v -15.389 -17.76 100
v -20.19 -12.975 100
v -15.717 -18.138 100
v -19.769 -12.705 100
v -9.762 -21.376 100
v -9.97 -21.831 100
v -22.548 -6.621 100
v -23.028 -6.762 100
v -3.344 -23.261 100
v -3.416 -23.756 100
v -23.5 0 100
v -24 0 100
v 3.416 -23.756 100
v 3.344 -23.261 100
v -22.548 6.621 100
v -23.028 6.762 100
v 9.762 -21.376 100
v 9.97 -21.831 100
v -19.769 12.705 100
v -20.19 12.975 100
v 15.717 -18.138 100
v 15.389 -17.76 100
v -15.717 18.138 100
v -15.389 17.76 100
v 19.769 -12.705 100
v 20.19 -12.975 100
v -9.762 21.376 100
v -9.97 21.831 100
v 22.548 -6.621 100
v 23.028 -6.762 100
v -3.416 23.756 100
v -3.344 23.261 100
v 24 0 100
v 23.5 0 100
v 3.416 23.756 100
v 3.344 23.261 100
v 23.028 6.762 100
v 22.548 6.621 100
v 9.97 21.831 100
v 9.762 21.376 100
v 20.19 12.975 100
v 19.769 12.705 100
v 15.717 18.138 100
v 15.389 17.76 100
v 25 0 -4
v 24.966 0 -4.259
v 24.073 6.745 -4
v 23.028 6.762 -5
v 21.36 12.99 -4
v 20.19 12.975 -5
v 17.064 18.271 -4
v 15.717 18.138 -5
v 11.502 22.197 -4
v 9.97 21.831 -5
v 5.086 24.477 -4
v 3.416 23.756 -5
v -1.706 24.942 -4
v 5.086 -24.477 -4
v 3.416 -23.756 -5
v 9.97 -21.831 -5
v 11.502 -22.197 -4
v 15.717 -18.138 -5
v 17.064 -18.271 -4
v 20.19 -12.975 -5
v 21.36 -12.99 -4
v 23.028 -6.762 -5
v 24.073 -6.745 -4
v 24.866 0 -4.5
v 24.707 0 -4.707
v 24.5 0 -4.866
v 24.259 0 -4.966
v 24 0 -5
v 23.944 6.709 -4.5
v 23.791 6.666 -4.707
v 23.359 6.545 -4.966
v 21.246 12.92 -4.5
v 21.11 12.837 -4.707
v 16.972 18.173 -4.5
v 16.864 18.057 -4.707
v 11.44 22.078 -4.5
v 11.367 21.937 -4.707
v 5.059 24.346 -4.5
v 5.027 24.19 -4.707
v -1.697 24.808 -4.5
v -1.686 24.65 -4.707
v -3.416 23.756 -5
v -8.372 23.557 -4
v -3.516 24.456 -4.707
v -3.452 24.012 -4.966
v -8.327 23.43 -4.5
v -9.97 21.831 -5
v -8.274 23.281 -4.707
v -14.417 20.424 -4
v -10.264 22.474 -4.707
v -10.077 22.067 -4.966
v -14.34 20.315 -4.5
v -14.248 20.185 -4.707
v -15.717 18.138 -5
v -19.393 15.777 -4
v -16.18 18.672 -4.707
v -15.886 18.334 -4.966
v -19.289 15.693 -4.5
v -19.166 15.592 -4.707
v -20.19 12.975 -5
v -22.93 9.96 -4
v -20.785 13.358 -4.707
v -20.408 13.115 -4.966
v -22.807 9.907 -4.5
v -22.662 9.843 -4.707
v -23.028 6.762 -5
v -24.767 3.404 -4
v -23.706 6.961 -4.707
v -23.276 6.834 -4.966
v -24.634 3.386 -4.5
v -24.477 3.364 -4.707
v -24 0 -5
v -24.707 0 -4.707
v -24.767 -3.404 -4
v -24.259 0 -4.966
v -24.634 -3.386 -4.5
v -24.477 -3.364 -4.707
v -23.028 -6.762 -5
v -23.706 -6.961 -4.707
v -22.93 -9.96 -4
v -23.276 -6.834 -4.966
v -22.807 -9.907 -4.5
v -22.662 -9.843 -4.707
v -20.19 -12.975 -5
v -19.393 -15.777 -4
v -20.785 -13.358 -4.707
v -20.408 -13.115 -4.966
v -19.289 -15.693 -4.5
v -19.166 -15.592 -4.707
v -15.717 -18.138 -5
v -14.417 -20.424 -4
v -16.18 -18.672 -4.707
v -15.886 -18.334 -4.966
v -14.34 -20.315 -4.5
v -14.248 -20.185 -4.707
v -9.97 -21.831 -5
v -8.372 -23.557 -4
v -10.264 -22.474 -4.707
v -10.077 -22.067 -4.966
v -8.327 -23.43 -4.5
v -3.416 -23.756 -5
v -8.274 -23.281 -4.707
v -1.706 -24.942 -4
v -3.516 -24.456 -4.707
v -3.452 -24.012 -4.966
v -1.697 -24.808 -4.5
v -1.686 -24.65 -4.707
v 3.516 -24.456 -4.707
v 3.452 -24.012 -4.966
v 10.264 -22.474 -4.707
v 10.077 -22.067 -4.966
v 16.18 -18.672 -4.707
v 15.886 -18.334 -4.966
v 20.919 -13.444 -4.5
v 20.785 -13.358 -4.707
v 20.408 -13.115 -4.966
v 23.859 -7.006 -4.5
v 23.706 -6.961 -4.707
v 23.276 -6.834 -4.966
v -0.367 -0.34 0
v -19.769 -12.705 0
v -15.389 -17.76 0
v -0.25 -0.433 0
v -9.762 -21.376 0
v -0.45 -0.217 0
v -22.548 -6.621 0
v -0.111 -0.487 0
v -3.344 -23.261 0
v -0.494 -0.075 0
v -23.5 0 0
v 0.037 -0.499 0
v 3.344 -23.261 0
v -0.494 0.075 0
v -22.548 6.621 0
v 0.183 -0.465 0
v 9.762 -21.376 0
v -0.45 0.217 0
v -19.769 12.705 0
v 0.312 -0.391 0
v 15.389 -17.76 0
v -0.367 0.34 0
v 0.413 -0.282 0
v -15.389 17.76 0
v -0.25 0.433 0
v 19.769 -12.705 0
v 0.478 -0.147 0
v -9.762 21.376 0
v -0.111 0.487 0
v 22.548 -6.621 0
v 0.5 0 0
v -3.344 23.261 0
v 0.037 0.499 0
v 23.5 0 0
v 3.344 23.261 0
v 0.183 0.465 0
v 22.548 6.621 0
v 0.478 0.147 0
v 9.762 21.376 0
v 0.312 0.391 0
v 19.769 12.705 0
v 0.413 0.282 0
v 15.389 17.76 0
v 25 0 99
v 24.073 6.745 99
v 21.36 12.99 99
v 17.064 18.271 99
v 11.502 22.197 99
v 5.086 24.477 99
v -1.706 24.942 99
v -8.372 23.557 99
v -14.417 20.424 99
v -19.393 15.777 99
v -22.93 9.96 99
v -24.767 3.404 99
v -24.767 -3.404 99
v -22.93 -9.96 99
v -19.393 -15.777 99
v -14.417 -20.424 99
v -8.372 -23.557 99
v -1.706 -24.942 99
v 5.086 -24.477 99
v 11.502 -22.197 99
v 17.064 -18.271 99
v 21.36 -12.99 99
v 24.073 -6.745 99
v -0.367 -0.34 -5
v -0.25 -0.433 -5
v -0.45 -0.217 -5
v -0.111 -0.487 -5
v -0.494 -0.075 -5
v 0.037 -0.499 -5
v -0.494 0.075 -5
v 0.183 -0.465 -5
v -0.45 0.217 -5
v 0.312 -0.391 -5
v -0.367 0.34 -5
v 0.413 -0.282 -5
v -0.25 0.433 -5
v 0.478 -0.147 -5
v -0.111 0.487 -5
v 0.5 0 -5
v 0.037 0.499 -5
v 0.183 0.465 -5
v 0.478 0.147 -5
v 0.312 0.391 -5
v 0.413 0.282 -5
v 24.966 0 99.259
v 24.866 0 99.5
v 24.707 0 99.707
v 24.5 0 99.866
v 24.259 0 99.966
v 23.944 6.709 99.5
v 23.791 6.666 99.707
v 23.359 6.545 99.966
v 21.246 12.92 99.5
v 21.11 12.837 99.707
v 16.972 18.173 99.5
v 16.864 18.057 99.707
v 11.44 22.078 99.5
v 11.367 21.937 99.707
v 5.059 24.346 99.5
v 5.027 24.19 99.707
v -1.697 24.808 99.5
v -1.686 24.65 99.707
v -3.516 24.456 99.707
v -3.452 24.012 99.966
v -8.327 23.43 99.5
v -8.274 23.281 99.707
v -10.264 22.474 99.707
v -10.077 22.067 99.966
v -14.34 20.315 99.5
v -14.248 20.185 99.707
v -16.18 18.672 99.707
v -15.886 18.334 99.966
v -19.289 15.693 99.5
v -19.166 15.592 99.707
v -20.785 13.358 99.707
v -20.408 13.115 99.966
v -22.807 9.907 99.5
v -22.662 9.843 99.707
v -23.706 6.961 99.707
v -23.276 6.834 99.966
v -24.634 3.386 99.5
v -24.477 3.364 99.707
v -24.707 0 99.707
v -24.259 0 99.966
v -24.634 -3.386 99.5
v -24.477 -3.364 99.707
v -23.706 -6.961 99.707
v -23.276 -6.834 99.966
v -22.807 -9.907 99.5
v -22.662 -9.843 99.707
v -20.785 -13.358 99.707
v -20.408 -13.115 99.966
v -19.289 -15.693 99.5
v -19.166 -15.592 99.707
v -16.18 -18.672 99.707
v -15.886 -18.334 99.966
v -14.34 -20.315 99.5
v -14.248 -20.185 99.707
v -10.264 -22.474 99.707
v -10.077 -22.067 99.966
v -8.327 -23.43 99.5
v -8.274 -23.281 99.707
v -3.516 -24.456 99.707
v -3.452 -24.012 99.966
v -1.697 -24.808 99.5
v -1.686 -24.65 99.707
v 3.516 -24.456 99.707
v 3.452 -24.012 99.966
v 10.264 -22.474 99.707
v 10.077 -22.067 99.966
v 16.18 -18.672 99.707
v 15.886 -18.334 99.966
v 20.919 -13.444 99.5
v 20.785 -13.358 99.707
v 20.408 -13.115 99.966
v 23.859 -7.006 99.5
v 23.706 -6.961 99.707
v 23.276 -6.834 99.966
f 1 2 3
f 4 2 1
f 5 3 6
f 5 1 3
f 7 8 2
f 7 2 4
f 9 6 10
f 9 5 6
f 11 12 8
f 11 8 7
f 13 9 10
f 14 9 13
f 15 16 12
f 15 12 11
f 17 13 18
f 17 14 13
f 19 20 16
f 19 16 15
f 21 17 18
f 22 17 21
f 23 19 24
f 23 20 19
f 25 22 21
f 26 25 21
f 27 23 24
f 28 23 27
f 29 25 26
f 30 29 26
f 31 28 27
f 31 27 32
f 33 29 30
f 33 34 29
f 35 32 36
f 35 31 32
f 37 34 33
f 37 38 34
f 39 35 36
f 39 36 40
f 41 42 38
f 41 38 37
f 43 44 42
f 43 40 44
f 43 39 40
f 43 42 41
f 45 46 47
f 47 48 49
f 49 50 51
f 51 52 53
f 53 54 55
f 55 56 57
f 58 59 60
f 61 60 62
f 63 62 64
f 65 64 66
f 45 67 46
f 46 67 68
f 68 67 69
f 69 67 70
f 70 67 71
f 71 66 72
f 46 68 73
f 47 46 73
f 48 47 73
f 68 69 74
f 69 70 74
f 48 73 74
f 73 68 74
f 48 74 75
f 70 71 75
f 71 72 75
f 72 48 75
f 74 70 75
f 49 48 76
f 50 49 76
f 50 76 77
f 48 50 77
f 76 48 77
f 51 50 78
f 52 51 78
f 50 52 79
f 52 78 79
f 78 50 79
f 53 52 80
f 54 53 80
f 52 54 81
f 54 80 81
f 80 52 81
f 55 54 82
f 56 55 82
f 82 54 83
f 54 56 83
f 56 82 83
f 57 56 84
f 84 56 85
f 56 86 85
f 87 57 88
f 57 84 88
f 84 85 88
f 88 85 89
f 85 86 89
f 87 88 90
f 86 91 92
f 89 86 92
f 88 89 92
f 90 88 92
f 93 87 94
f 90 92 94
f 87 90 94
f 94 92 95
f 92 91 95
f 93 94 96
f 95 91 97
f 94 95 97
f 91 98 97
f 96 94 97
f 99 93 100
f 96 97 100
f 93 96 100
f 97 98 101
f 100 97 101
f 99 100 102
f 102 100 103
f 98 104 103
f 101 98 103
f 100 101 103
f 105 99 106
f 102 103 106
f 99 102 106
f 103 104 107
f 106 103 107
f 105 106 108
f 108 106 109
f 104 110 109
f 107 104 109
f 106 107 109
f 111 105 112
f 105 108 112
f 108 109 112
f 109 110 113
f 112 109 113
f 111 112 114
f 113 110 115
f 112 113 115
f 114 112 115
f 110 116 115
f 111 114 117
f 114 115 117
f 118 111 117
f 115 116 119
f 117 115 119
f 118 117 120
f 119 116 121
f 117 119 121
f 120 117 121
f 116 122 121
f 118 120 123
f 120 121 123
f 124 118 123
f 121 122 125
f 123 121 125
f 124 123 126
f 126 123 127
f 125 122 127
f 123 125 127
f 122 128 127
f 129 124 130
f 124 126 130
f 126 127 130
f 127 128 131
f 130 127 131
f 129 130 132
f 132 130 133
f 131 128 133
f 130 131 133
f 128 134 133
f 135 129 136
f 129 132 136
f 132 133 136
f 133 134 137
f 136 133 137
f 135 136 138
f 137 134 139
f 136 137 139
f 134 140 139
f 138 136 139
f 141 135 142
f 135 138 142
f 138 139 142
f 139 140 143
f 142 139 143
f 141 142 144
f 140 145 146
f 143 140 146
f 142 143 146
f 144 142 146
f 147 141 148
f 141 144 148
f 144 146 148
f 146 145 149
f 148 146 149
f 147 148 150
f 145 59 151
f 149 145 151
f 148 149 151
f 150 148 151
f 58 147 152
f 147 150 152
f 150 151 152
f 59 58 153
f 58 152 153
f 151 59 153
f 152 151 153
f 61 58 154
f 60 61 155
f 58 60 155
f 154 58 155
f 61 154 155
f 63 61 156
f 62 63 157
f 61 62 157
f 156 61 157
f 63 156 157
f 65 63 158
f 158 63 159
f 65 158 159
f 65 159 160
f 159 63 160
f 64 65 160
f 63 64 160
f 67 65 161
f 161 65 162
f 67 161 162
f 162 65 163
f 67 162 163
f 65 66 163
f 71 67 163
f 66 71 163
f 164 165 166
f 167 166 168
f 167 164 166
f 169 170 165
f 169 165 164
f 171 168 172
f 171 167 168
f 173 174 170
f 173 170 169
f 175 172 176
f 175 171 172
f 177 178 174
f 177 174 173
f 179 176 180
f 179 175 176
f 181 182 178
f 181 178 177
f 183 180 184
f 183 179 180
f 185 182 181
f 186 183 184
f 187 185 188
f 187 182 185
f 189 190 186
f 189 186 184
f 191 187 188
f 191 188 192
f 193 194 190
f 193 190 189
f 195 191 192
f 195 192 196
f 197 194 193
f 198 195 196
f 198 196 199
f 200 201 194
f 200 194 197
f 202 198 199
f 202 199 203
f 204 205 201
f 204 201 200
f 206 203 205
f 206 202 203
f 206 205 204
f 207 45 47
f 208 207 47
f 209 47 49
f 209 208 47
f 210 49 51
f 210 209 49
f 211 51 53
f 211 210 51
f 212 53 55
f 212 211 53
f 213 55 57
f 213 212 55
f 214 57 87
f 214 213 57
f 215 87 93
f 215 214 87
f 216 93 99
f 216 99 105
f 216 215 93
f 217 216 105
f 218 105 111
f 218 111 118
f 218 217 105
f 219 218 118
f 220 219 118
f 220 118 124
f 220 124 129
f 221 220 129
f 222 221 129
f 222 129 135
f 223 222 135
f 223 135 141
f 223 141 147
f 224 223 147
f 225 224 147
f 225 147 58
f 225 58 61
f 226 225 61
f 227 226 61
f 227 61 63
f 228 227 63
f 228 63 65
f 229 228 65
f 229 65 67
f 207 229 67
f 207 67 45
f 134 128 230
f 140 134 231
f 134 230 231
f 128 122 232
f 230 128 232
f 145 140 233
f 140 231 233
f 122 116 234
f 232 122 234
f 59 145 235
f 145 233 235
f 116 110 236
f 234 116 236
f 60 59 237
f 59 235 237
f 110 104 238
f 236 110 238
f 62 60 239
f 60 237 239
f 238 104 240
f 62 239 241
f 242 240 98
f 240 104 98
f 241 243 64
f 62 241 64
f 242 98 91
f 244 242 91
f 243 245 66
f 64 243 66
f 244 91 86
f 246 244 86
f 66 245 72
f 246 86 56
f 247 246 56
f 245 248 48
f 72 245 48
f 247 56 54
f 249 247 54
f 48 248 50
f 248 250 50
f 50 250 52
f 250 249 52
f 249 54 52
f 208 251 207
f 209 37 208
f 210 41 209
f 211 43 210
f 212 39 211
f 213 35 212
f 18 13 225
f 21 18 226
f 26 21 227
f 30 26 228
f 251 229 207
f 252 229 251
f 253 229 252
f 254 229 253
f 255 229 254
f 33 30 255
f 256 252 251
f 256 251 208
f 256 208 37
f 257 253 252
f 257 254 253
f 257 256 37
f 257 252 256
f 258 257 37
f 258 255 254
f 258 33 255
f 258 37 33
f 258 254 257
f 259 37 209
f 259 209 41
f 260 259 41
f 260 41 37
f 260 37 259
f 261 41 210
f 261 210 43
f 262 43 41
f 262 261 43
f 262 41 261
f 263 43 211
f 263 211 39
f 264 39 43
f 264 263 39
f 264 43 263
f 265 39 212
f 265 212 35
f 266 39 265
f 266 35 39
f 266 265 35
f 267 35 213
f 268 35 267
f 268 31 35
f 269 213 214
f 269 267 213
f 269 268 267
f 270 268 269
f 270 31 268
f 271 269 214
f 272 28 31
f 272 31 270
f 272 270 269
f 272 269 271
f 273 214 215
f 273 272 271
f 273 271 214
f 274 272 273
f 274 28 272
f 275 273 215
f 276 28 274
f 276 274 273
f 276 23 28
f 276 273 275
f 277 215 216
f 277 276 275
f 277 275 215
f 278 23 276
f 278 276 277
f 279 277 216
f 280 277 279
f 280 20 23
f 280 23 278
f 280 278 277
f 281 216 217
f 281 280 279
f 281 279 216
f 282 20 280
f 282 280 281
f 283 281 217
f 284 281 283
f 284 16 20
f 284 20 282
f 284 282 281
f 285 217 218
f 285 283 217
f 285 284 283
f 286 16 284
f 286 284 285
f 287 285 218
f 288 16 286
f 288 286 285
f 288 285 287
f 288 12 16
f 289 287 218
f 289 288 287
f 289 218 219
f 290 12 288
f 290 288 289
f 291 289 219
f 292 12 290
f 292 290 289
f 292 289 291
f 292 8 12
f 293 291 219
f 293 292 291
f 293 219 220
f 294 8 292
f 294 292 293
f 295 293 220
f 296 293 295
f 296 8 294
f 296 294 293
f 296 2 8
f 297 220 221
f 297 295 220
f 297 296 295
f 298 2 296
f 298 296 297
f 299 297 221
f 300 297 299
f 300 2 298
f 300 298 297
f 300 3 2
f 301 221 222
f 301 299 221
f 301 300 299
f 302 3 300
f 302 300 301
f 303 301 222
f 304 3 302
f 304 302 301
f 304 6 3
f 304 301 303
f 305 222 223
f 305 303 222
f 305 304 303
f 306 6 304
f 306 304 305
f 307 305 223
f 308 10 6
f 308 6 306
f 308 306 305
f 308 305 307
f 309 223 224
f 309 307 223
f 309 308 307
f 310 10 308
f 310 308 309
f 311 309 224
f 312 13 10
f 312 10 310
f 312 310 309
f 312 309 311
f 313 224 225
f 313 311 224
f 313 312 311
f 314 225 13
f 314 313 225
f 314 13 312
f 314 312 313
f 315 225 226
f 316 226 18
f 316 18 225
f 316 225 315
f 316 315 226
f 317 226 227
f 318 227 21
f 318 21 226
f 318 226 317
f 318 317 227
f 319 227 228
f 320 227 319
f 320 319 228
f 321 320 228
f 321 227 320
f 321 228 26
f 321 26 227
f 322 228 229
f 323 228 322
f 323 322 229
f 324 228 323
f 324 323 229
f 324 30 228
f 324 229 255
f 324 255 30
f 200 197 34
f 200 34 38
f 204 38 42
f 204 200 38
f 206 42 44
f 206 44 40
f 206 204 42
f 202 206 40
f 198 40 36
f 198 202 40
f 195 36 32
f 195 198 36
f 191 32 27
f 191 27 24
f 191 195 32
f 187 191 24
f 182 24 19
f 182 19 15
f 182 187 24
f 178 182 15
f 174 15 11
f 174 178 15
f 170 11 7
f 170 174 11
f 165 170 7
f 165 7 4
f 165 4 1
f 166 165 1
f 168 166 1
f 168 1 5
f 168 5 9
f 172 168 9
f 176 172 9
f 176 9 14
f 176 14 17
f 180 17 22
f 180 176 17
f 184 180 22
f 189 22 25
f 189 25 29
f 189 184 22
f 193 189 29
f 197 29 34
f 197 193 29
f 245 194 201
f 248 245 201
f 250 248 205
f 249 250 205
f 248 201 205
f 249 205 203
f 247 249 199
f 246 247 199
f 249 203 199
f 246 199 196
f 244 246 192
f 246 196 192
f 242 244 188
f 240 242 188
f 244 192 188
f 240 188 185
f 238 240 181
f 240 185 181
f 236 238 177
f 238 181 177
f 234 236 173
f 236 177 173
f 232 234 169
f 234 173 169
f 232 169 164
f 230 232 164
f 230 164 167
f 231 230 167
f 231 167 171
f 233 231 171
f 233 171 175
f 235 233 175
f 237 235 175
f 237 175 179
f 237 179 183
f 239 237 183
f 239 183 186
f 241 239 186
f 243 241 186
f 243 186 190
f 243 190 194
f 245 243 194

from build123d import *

# Parameters (mm, degrees)
F0_R     = 25
F0_R_2   = 23.5
F1_DEPTH = 100
F2_R     = 25
F3_DEPTH = 5
F4_R     = 1
F5_R     = 0.5
F6_DEPTH = 25


with BuildPart() as f1:
    # F0 (on Top) → F1 (new body)
    with BuildSketch(Plane.XY):
        Circle(F0_R)
        Circle(F0_R_2, mode=Mode.SUBTRACT)
    extrude(amount=F1_DEPTH)

    # F2 (on Top) → F3 (join)
    with BuildSketch(Plane.XY):
        Circle(F2_R)
    extrude(amount=-F3_DEPTH)

    # F4
    f4_edges = [f1.edges().sort_by_distance(p)[0] for p in [
        (-25, 0, -5),
        (-25, 0, 100),
    ]]
    fillet(f4_edges, radius=F4_R)

    # F5 (on Top) → F6 (cut)
    with BuildSketch(Plane.XY):
        Circle(F5_R)
    extrude(amount=-F6_DEPTH, mode=Mode.SUBTRACT)


solid = f1.part
